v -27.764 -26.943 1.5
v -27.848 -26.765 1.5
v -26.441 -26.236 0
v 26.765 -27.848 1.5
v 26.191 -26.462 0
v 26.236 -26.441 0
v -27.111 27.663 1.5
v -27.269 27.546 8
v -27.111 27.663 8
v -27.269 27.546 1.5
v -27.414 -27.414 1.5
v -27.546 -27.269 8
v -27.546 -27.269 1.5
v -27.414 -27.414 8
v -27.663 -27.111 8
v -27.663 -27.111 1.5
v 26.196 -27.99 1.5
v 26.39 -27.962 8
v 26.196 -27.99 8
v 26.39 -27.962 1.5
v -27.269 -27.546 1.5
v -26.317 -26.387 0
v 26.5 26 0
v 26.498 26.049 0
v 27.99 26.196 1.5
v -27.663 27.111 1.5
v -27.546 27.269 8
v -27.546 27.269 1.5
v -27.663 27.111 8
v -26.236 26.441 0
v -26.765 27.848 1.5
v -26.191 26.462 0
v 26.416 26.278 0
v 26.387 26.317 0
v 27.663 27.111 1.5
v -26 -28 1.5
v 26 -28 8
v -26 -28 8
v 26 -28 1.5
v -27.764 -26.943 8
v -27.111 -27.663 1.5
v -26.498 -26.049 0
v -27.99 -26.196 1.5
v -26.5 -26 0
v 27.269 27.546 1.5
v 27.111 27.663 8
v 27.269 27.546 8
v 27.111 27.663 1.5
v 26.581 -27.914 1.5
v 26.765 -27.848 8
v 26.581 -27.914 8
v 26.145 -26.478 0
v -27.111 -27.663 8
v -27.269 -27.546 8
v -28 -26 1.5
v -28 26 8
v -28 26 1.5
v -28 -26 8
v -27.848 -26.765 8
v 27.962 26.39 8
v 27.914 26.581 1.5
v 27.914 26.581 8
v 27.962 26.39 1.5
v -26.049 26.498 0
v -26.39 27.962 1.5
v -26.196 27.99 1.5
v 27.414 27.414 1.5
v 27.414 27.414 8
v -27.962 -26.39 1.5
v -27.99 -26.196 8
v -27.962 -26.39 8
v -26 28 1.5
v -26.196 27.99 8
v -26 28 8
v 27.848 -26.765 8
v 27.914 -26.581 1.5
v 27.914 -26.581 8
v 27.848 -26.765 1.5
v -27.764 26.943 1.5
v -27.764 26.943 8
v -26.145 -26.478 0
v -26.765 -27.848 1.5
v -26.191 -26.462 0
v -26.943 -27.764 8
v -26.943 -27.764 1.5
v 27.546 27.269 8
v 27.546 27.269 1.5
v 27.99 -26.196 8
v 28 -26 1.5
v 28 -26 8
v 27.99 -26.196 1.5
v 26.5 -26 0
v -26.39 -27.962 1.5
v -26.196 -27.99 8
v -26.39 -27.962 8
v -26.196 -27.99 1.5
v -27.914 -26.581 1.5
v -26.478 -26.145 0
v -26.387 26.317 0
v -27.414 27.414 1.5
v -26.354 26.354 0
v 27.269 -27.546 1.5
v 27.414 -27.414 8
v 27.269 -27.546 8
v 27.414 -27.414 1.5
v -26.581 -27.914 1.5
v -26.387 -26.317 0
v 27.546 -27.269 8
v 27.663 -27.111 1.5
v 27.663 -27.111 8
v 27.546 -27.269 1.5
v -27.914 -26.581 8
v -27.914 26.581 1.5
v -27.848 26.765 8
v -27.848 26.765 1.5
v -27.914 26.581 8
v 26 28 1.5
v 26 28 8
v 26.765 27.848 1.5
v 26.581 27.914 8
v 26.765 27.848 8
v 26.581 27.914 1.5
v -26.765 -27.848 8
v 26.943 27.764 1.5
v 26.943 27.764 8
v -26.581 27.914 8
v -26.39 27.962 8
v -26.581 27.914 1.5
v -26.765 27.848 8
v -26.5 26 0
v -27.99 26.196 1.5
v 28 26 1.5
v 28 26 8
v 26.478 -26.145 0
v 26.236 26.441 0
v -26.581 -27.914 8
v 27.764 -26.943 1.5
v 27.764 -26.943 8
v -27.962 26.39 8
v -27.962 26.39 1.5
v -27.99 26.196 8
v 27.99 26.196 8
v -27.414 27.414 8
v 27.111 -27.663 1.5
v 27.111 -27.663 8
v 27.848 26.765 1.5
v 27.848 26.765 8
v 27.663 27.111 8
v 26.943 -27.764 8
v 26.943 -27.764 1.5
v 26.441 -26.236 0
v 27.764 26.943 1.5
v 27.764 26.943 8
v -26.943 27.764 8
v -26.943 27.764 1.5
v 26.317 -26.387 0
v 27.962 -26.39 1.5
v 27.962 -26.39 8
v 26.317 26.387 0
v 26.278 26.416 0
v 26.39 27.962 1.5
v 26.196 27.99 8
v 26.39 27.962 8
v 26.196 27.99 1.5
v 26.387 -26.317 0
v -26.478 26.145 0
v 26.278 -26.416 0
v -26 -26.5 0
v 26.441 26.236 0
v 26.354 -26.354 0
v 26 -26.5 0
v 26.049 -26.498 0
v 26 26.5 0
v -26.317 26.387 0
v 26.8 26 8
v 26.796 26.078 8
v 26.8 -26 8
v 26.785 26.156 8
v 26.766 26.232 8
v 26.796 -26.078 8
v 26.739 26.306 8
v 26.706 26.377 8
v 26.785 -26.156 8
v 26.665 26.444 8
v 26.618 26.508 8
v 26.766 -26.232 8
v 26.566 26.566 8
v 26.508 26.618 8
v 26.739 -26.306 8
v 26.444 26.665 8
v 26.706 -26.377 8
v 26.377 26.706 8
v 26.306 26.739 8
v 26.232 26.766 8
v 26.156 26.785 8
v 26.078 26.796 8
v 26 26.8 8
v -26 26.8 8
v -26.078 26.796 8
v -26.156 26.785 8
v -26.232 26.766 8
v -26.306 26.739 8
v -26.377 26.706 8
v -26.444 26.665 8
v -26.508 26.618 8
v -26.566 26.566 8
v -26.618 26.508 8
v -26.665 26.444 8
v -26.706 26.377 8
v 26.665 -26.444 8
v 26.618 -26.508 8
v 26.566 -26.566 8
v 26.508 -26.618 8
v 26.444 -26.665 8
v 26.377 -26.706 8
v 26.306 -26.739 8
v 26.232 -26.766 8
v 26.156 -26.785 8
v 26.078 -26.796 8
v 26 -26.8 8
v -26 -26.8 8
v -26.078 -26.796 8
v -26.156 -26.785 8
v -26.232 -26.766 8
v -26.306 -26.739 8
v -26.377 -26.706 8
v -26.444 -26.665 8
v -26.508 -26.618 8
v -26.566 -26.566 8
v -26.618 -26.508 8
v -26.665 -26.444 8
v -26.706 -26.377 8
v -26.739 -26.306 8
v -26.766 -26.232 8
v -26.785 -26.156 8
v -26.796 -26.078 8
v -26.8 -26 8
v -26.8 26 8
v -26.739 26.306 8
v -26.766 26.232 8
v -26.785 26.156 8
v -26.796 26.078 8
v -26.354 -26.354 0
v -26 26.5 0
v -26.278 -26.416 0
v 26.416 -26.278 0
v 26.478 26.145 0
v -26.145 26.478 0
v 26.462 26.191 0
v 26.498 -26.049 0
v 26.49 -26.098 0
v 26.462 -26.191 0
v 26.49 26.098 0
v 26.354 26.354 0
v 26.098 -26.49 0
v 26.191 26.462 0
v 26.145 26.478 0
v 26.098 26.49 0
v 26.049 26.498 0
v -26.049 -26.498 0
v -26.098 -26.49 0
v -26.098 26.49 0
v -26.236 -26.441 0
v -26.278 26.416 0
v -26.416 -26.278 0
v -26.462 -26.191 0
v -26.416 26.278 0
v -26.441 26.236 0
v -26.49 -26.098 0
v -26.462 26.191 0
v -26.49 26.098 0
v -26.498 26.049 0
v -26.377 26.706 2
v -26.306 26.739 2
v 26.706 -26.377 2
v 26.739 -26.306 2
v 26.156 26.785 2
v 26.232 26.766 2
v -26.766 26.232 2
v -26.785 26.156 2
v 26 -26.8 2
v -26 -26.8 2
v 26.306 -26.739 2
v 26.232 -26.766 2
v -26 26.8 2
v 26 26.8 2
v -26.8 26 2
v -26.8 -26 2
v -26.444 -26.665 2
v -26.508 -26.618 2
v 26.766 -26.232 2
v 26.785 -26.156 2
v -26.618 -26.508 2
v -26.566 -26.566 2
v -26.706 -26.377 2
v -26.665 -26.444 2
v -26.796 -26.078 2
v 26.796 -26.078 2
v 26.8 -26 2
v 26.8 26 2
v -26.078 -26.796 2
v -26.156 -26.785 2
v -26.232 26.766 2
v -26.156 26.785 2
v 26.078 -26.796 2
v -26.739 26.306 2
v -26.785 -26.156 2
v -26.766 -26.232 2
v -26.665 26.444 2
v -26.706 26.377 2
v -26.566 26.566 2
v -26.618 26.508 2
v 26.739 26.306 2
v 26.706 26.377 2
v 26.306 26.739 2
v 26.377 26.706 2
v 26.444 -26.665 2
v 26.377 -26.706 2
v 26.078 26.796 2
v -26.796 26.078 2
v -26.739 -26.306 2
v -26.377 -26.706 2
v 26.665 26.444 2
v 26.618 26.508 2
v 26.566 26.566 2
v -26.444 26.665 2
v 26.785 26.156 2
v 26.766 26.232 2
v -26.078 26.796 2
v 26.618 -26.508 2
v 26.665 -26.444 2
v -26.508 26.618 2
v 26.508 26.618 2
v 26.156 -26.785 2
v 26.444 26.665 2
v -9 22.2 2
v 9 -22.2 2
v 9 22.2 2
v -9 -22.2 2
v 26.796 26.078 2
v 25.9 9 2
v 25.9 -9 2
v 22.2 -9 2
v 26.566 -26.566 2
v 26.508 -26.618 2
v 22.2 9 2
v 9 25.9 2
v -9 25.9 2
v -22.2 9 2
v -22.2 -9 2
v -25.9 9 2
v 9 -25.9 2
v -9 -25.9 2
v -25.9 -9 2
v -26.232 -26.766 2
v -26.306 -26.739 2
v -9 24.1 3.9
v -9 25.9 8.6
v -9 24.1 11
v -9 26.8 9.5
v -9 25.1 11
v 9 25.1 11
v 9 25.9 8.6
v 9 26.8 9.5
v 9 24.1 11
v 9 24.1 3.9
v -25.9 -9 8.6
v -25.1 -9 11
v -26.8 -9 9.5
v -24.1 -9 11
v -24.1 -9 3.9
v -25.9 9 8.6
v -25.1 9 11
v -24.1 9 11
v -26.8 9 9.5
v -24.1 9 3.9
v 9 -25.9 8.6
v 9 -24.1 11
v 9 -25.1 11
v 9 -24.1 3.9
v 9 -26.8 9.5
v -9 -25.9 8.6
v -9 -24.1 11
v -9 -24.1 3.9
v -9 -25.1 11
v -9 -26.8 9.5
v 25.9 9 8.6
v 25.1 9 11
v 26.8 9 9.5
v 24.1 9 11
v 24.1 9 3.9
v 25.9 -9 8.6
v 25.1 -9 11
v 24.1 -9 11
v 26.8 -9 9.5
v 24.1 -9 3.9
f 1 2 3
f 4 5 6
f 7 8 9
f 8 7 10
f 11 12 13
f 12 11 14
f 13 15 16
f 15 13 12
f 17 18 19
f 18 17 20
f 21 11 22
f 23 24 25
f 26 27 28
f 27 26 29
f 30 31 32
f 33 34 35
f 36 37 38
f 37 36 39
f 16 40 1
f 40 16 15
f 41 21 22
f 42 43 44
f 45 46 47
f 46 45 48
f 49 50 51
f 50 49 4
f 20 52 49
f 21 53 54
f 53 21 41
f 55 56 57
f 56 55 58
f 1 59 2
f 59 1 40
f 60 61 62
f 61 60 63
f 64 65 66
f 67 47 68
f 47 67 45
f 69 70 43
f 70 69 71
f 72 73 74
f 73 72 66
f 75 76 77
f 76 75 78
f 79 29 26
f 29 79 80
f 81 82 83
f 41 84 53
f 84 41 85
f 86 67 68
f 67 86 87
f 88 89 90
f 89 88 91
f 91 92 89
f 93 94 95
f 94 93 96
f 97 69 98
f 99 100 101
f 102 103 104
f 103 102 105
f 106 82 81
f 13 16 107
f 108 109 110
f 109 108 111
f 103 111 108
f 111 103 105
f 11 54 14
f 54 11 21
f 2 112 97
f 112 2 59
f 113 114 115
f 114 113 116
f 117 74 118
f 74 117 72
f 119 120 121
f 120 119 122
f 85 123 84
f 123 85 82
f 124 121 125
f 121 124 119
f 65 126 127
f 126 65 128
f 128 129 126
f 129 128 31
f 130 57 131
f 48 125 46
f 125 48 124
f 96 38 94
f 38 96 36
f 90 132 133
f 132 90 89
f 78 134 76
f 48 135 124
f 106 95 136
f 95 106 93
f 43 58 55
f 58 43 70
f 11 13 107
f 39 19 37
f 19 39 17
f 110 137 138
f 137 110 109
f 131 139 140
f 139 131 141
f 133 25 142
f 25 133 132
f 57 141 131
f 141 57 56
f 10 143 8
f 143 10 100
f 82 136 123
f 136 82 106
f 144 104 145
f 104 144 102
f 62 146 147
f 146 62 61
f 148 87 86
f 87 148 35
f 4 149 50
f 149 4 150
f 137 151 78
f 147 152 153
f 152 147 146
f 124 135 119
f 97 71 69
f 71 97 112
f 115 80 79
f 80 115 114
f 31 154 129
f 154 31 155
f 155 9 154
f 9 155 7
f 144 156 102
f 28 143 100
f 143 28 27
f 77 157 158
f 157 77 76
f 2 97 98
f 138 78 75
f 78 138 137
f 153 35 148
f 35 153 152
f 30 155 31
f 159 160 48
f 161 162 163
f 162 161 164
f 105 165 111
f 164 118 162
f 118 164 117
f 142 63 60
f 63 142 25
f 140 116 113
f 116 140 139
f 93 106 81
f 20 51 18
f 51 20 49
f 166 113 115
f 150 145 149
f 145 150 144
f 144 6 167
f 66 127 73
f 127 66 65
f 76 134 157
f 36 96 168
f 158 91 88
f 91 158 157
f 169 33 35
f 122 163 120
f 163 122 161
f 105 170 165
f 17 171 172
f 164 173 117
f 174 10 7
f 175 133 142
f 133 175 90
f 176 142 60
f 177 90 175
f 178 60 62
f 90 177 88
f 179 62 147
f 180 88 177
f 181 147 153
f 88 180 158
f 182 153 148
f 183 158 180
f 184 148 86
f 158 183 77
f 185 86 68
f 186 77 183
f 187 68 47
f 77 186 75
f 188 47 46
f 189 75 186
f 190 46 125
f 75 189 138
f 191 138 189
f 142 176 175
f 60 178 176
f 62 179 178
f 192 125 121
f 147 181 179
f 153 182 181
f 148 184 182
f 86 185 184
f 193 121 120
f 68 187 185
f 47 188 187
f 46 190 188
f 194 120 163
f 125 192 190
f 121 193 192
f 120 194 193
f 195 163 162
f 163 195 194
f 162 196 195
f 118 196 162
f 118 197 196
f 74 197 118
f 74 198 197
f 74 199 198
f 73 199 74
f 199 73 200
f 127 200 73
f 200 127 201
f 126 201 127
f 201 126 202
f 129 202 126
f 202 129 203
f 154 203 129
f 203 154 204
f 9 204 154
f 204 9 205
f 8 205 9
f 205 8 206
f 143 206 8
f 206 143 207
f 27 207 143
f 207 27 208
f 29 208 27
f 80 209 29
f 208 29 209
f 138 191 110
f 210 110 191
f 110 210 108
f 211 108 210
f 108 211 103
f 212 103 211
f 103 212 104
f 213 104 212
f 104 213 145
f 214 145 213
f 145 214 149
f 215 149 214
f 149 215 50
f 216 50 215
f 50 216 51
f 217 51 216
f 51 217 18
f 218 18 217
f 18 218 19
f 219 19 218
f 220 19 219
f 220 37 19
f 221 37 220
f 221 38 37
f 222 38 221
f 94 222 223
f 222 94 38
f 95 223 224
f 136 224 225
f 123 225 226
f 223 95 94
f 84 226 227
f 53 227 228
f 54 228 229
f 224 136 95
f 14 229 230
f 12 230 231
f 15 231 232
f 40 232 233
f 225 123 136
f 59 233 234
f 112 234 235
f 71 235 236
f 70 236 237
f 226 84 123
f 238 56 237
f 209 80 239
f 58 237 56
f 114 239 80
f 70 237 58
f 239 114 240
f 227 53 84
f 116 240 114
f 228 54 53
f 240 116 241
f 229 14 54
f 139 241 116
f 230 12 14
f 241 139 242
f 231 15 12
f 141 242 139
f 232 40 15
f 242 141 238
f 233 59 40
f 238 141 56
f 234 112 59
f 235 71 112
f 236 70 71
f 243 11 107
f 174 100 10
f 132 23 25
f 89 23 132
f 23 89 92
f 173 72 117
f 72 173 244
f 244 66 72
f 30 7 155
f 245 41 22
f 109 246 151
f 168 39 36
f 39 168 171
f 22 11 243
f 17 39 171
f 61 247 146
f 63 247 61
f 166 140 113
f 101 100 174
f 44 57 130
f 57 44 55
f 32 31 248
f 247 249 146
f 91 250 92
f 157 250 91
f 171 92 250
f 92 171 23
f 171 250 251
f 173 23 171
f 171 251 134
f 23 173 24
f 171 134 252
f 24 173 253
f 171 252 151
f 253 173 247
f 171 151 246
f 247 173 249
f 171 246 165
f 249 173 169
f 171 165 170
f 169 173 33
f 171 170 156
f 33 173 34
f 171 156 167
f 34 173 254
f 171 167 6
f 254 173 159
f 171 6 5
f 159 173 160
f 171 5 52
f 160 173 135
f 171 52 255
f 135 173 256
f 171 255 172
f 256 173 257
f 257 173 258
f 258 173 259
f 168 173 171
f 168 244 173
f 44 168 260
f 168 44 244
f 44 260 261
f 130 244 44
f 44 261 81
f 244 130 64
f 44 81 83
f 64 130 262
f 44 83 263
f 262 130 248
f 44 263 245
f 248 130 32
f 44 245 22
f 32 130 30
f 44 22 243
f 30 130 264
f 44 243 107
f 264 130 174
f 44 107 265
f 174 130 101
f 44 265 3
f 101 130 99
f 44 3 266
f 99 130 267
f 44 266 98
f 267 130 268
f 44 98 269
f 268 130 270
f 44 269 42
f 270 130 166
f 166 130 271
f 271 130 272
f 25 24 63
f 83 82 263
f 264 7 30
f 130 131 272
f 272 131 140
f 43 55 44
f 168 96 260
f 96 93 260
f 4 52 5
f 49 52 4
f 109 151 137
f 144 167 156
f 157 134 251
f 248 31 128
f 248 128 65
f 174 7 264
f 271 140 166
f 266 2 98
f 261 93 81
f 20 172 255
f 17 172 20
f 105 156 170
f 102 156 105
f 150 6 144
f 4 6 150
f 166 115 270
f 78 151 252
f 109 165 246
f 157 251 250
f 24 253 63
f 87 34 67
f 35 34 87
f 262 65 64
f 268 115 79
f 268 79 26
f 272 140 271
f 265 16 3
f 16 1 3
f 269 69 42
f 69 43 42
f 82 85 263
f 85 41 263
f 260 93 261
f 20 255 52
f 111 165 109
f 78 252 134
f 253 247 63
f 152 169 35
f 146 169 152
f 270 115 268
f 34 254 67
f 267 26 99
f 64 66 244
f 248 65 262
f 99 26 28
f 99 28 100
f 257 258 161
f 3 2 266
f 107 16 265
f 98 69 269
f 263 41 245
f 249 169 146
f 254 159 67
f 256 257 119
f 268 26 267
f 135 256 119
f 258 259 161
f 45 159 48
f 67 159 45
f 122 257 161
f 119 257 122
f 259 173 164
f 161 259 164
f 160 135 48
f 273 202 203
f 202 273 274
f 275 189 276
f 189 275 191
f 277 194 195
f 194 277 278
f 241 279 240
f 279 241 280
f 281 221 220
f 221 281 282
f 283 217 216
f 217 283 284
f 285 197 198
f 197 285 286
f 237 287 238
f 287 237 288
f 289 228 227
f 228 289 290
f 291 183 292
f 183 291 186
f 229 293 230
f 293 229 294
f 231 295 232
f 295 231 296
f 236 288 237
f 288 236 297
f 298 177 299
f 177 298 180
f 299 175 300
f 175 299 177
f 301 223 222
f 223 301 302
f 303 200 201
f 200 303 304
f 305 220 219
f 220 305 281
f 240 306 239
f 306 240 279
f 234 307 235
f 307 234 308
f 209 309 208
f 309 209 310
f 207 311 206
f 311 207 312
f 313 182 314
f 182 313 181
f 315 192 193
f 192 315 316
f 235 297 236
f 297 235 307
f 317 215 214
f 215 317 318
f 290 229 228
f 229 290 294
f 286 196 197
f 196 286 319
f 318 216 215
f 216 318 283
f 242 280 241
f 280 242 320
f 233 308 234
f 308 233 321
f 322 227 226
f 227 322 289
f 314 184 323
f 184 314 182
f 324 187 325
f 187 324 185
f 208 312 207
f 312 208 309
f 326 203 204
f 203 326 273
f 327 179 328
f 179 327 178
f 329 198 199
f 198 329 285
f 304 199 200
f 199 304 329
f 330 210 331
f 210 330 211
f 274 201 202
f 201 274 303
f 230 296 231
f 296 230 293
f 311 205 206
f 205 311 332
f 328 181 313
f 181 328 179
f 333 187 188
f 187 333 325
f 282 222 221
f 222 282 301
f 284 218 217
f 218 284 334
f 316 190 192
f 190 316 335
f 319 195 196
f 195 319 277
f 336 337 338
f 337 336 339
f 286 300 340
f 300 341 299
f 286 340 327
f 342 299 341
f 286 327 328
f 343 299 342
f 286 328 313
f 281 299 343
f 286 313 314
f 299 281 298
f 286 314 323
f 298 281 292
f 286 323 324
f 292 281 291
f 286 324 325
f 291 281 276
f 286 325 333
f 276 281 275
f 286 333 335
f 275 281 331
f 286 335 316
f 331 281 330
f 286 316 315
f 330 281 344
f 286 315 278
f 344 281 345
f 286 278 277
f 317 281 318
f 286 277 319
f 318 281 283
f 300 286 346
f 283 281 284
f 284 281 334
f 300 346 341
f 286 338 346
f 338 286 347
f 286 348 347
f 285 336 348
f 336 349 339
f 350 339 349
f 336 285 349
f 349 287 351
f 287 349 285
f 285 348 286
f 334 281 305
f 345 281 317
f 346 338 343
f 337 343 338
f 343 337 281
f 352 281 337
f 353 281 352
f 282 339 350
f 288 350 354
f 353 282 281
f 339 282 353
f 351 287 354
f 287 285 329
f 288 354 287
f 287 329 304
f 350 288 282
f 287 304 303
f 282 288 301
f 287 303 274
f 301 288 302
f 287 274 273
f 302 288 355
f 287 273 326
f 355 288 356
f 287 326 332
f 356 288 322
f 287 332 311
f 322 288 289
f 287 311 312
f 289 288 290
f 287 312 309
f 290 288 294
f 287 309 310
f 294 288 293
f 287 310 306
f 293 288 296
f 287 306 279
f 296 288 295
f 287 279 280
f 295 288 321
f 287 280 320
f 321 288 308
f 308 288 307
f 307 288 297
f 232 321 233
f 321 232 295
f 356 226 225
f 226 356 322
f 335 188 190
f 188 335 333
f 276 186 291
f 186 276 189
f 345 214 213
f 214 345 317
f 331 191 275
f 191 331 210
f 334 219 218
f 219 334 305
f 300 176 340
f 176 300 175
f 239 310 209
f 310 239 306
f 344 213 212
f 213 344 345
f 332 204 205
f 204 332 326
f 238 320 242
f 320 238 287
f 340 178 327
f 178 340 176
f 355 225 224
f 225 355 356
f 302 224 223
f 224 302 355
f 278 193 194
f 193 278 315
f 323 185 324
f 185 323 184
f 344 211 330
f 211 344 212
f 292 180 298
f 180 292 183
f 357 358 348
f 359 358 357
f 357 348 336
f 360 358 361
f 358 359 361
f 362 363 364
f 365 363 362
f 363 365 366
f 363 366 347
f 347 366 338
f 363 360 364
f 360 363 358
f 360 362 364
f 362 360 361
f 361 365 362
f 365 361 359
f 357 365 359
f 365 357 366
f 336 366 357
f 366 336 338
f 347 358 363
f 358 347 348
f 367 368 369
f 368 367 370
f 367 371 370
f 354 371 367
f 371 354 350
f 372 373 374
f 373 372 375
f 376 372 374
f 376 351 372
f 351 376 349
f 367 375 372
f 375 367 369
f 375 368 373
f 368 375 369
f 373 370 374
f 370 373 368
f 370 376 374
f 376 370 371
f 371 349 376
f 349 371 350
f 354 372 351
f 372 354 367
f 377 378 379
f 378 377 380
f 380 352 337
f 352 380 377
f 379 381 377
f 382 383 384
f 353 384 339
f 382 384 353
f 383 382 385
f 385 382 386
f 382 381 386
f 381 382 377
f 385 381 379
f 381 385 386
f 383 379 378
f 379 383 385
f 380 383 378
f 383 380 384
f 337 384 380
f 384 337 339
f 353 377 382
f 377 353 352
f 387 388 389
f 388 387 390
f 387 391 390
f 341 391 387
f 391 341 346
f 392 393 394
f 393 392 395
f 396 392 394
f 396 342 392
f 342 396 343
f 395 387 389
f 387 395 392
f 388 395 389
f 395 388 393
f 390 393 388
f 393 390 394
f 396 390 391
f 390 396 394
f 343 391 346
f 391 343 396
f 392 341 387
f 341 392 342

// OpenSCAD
// Ligerus-Blank.scad
// Version: v3.00
// Date: 2026-06-25
// Description: Parametric Blank Cover Plate for Liregus Epsilon "Slim Line" frames.
// Revised design: Independent flexible snap tabs sprout from the face plate.
// The main cover skirt is shallow and does not pass through the frame opening.

// ========================
// PARAMETERS
// ========================

/* [Display Mode] */
// Select which part to render
mode = "print"; // [print: Print Mode (Face Down), assembly: Assembly View (Inside Frame), solid: Solid Blank Plate with No Tabs]

/* [Epsilon Frame Dimensions] */
// Outer size of the blank cover cap (standard is 55.2mm to fit Epsilon's 55.8mm opening)
cover_size = 56; // [50:60]
// Total depth/thickness of the Epsilon Slim Line frame (standard is 9.5mm)
frame_depth = 9.5; // [5:15]
// Corner radius of the cover cap
corner_radius = 2.0; // [0.5:5]
// Bevel/chamfer size on the front edges of the cover cap
front_chamfer = 1.5; // [0:3]

/* [Frame Mounting Tabs (Notch Specs)] */
// Thickness of the frame's flat sections (standard is 1.0mm)
frame_tab_thickness = 1.0; // [0.5:2.5]
// Width of the frame's flat sections (standard is 20.0mm)
frame_tab_width = 20.0; // [10:30]
// Inner opening size between opposite flat sections (standard is 52.0mm)
frame_tab_opening = 52.0; // [45:55]

/* [Cover Shell] */
// Depth of the cover's outer skirt (must be less than frame_depth - frame_tab_thickness)
skirt_depth = 8.0; // [4.0:9.0]
// Thickness of the cover cap's outer wall (skirt)
wall_thickness = 1.2; // [0.8:3.0]
// Thickness of the cover cap's front face
face_thickness = 2.0; // [1.2:4.0]
// Enable a small pry notch on the bottom edge for easy removal
pry_notch = false;

/* [Snap-Fit Tabs] */
// Width of the snap tabs (fits easily inside the 20mm frame tabs)
tab_width = 18.0; // [10:25]
// Thickness of the snap tab cantilever wall
tab_thickness = 1.8; // [1.0:3.0]
// Radial clearance between snap tab and frame opening
tab_clearance = 0.1; // [0.0:0.5]
// How far the hook lip overlaps the frame tab radially
hook_overlap = 0.8; // [0.3:1.5]
// Axial play to ensure the hook easily snaps behind the frame tab
hook_play = 0.0; // [0.0:0.5]
// Angle of the hook's bottom ramp (allows support-free printing & pull-to-release)
release_angle = 45; // [30:60]
// How far the tab extends past the hook (tapered lead-in for easy insertion)
tab_extension = 1.5; // [1.0:3.0]
// Width of the inner reinforcement gusset to prevent breaking off
gusset_width = 2.0; // [0.0:5.0]
// Height of the inner reinforcement gusset to prevent breaking off
gusset_height = 2.0; // [0.0:8.0]

/* [Rendering Quality] */
// Number of segments for circles ($fn)
render_segments = 64; // [32, 64, 128]


// ========================
// INTERNAL CALCULATIONS
// ========================

$fn = render_segments;
delta = 0.05;

// Radial boundaries (from center of blank)
recess_radius = frame_tab_opening / 2;                // ~ 26.0mm
tab_outer_r = recess_radius - tab_clearance;          // ~ 25.8mm
tab_inner_r = tab_outer_r - tab_thickness;            // ~ 24.0mm
hook_peak_r = recess_radius + hook_overlap;           // ~ 26.8mm
lead_in_r = tab_outer_r - 0.8;                        // ~ 25.0mm

// Height boundaries (from front face at Z=0)
z_base = face_thickness - 0.1;                        // Sink into face plate slightly for manifold union
z_hook = frame_depth + hook_play;                     // ~ 9.7mm (Hooks behind the 9.5mm frame)

// Calculate ramp start based on angle (tan(angle) = radius_diff / height_diff)
ramp_h = (hook_peak_r - tab_outer_r) / tan(release_angle);
z_ramp_start = z_hook - ramp_h;

z_top = z_hook + tab_extension;                       // ~ 11.2mm


// ========================
// PROFILE POLYGON FOR SNAP TABS
// ========================

// 2D profile [Radius, Z-height] of the snap tab
// Designed with a release ramp to allow pulling out and support-free printing
profile_points = [
    [tab_inner_r - gusset_width, z_base], // 1. Extended inner base for reinforcing gusset
    [tab_inner_r, z_base + gusset_height], // 2. Top of inner gusset (angles up into the wall)
    [tab_inner_r, z_top],                  // 3. Top-inner corner (tip of the tab in wall)
    [lead_in_r,   z_top],                  // 4. Tip outer edge (tapered lead-in)
    [hook_peak_r, z_hook],                 // 5. Snap lip peak (hooks behind frame tab)
    [tab_outer_r, z_ramp_start],           // 6. Base of the hook ramp (release cam)
    [tab_outer_r, z_base]                  // 7. Bottom-outer corner (at face plate)
];


// ========================
// HELPER MODULES
// ========================

module rounded_box(x, y, z, radius) {
    hull() {
        for(ix = [-1, 1], iy = [-1, 1]) {
            translate([ix * (x/2 - radius), iy * (y/2 - radius), 0])
            cylinder(r = radius, h = z);
        }
    }
}

module rounded_front_box(x, y, z, r_xy, r_z) {
    hull() {
        for(ix = [-1, 1], iy = [-1, 1]) {
            translate([ix * (x/2 - r_xy), iy * (y/2 - r_xy), 0]) {
                cylinder(r1 = r_xy - r_z, r2 = r_xy, h = r_z);
                translate([0, 0, r_z])
                cylinder(r = r_xy, h = z - r_z);
            }
        }
    }
}


// ========================
// COMPONENT MODULES
// ========================

module blank_plate() {
    union() {
        // 1. Main Cover Shell (Skirt)
        difference() {
            // Outer shell with rounded corners and beveled front
            rounded_front_box(cover_size, cover_size, skirt_depth, corner_radius, front_chamfer);

            // Hollow out the interior
            translate([0, 0, face_thickness])
            rounded_box(cover_size - wall_thickness * 2, cover_size - wall_thickness * 2, skirt_depth, max(0.1, corner_radius - wall_thickness));

            // Optional pry notch on bottom edge (Y- side, at the back of the skirt)
            if (pry_notch) {
                translate([0, -cover_size/2, skirt_depth])
                rotate([45, 0, 0])
                translate([-1.5, -1.0, -1.0])
                cube([3.0, 2.0, 2.0]);
            }
        }

        // 2. The 4 Free-Standing Snap Tabs
        for(r = [0, 90, 180, 270]) {
            rotate([0, 0, r])
            // Orient for X-axis extrusion
            rotate([90, 0, 90])
            linear_extrude(height = tab_width, center = true)
            polygon(points = profile_points);
        }
    }
}

module mock_frame() {
    color([0.7, 0.7, 0.7, 0.4]) // Semi-transparent gray
    difference() {
        // Main frame outer body
        rounded_box(82.0, 82.0, frame_depth, 5.0);

        // Frame main front opening (55.8 x 55.8mm)
        translate([0, 0, -delta])
        rounded_box(55.8, 55.8, frame_depth + delta * 2, corner_radius);
    }

    // Render the 4 orange frame tabs/flat sections at the very back
    color([1.0, 0.5, 0.0, 0.7]) // Semi-transparent bright amber
    for(r = [0, 90, 180, 270]) {
        rotate([0, 0, r])
        translate([-frame_tab_width/2, frame_tab_opening/2, frame_depth - frame_tab_thickness])
        cube([frame_tab_width, (55.8 - frame_tab_opening)/2 + delta, frame_tab_thickness]);
    }
}

module solid_blank() {
    difference() {
        rounded_front_box(cover_size, cover_size, skirt_depth, corner_radius, front_chamfer);

        translate([0, 0, face_thickness])
        rounded_box(cover_size - wall_thickness * 2, cover_size - wall_thickness * 2, skirt_depth, max(0.1, corner_radius - wall_thickness));
    }
}


// ========================
// MAIN RENDER LOGIC
// ========================

if (mode == "print") {
    // Print Mode: Face-down on the Z=0 plane (already properly oriented)
    blank_plate();
} else if (mode == "assembly") {
    mock_frame();

    color("White")
    blank_plate();
} else if (mode == "solid") {
    solid_blank();
}
